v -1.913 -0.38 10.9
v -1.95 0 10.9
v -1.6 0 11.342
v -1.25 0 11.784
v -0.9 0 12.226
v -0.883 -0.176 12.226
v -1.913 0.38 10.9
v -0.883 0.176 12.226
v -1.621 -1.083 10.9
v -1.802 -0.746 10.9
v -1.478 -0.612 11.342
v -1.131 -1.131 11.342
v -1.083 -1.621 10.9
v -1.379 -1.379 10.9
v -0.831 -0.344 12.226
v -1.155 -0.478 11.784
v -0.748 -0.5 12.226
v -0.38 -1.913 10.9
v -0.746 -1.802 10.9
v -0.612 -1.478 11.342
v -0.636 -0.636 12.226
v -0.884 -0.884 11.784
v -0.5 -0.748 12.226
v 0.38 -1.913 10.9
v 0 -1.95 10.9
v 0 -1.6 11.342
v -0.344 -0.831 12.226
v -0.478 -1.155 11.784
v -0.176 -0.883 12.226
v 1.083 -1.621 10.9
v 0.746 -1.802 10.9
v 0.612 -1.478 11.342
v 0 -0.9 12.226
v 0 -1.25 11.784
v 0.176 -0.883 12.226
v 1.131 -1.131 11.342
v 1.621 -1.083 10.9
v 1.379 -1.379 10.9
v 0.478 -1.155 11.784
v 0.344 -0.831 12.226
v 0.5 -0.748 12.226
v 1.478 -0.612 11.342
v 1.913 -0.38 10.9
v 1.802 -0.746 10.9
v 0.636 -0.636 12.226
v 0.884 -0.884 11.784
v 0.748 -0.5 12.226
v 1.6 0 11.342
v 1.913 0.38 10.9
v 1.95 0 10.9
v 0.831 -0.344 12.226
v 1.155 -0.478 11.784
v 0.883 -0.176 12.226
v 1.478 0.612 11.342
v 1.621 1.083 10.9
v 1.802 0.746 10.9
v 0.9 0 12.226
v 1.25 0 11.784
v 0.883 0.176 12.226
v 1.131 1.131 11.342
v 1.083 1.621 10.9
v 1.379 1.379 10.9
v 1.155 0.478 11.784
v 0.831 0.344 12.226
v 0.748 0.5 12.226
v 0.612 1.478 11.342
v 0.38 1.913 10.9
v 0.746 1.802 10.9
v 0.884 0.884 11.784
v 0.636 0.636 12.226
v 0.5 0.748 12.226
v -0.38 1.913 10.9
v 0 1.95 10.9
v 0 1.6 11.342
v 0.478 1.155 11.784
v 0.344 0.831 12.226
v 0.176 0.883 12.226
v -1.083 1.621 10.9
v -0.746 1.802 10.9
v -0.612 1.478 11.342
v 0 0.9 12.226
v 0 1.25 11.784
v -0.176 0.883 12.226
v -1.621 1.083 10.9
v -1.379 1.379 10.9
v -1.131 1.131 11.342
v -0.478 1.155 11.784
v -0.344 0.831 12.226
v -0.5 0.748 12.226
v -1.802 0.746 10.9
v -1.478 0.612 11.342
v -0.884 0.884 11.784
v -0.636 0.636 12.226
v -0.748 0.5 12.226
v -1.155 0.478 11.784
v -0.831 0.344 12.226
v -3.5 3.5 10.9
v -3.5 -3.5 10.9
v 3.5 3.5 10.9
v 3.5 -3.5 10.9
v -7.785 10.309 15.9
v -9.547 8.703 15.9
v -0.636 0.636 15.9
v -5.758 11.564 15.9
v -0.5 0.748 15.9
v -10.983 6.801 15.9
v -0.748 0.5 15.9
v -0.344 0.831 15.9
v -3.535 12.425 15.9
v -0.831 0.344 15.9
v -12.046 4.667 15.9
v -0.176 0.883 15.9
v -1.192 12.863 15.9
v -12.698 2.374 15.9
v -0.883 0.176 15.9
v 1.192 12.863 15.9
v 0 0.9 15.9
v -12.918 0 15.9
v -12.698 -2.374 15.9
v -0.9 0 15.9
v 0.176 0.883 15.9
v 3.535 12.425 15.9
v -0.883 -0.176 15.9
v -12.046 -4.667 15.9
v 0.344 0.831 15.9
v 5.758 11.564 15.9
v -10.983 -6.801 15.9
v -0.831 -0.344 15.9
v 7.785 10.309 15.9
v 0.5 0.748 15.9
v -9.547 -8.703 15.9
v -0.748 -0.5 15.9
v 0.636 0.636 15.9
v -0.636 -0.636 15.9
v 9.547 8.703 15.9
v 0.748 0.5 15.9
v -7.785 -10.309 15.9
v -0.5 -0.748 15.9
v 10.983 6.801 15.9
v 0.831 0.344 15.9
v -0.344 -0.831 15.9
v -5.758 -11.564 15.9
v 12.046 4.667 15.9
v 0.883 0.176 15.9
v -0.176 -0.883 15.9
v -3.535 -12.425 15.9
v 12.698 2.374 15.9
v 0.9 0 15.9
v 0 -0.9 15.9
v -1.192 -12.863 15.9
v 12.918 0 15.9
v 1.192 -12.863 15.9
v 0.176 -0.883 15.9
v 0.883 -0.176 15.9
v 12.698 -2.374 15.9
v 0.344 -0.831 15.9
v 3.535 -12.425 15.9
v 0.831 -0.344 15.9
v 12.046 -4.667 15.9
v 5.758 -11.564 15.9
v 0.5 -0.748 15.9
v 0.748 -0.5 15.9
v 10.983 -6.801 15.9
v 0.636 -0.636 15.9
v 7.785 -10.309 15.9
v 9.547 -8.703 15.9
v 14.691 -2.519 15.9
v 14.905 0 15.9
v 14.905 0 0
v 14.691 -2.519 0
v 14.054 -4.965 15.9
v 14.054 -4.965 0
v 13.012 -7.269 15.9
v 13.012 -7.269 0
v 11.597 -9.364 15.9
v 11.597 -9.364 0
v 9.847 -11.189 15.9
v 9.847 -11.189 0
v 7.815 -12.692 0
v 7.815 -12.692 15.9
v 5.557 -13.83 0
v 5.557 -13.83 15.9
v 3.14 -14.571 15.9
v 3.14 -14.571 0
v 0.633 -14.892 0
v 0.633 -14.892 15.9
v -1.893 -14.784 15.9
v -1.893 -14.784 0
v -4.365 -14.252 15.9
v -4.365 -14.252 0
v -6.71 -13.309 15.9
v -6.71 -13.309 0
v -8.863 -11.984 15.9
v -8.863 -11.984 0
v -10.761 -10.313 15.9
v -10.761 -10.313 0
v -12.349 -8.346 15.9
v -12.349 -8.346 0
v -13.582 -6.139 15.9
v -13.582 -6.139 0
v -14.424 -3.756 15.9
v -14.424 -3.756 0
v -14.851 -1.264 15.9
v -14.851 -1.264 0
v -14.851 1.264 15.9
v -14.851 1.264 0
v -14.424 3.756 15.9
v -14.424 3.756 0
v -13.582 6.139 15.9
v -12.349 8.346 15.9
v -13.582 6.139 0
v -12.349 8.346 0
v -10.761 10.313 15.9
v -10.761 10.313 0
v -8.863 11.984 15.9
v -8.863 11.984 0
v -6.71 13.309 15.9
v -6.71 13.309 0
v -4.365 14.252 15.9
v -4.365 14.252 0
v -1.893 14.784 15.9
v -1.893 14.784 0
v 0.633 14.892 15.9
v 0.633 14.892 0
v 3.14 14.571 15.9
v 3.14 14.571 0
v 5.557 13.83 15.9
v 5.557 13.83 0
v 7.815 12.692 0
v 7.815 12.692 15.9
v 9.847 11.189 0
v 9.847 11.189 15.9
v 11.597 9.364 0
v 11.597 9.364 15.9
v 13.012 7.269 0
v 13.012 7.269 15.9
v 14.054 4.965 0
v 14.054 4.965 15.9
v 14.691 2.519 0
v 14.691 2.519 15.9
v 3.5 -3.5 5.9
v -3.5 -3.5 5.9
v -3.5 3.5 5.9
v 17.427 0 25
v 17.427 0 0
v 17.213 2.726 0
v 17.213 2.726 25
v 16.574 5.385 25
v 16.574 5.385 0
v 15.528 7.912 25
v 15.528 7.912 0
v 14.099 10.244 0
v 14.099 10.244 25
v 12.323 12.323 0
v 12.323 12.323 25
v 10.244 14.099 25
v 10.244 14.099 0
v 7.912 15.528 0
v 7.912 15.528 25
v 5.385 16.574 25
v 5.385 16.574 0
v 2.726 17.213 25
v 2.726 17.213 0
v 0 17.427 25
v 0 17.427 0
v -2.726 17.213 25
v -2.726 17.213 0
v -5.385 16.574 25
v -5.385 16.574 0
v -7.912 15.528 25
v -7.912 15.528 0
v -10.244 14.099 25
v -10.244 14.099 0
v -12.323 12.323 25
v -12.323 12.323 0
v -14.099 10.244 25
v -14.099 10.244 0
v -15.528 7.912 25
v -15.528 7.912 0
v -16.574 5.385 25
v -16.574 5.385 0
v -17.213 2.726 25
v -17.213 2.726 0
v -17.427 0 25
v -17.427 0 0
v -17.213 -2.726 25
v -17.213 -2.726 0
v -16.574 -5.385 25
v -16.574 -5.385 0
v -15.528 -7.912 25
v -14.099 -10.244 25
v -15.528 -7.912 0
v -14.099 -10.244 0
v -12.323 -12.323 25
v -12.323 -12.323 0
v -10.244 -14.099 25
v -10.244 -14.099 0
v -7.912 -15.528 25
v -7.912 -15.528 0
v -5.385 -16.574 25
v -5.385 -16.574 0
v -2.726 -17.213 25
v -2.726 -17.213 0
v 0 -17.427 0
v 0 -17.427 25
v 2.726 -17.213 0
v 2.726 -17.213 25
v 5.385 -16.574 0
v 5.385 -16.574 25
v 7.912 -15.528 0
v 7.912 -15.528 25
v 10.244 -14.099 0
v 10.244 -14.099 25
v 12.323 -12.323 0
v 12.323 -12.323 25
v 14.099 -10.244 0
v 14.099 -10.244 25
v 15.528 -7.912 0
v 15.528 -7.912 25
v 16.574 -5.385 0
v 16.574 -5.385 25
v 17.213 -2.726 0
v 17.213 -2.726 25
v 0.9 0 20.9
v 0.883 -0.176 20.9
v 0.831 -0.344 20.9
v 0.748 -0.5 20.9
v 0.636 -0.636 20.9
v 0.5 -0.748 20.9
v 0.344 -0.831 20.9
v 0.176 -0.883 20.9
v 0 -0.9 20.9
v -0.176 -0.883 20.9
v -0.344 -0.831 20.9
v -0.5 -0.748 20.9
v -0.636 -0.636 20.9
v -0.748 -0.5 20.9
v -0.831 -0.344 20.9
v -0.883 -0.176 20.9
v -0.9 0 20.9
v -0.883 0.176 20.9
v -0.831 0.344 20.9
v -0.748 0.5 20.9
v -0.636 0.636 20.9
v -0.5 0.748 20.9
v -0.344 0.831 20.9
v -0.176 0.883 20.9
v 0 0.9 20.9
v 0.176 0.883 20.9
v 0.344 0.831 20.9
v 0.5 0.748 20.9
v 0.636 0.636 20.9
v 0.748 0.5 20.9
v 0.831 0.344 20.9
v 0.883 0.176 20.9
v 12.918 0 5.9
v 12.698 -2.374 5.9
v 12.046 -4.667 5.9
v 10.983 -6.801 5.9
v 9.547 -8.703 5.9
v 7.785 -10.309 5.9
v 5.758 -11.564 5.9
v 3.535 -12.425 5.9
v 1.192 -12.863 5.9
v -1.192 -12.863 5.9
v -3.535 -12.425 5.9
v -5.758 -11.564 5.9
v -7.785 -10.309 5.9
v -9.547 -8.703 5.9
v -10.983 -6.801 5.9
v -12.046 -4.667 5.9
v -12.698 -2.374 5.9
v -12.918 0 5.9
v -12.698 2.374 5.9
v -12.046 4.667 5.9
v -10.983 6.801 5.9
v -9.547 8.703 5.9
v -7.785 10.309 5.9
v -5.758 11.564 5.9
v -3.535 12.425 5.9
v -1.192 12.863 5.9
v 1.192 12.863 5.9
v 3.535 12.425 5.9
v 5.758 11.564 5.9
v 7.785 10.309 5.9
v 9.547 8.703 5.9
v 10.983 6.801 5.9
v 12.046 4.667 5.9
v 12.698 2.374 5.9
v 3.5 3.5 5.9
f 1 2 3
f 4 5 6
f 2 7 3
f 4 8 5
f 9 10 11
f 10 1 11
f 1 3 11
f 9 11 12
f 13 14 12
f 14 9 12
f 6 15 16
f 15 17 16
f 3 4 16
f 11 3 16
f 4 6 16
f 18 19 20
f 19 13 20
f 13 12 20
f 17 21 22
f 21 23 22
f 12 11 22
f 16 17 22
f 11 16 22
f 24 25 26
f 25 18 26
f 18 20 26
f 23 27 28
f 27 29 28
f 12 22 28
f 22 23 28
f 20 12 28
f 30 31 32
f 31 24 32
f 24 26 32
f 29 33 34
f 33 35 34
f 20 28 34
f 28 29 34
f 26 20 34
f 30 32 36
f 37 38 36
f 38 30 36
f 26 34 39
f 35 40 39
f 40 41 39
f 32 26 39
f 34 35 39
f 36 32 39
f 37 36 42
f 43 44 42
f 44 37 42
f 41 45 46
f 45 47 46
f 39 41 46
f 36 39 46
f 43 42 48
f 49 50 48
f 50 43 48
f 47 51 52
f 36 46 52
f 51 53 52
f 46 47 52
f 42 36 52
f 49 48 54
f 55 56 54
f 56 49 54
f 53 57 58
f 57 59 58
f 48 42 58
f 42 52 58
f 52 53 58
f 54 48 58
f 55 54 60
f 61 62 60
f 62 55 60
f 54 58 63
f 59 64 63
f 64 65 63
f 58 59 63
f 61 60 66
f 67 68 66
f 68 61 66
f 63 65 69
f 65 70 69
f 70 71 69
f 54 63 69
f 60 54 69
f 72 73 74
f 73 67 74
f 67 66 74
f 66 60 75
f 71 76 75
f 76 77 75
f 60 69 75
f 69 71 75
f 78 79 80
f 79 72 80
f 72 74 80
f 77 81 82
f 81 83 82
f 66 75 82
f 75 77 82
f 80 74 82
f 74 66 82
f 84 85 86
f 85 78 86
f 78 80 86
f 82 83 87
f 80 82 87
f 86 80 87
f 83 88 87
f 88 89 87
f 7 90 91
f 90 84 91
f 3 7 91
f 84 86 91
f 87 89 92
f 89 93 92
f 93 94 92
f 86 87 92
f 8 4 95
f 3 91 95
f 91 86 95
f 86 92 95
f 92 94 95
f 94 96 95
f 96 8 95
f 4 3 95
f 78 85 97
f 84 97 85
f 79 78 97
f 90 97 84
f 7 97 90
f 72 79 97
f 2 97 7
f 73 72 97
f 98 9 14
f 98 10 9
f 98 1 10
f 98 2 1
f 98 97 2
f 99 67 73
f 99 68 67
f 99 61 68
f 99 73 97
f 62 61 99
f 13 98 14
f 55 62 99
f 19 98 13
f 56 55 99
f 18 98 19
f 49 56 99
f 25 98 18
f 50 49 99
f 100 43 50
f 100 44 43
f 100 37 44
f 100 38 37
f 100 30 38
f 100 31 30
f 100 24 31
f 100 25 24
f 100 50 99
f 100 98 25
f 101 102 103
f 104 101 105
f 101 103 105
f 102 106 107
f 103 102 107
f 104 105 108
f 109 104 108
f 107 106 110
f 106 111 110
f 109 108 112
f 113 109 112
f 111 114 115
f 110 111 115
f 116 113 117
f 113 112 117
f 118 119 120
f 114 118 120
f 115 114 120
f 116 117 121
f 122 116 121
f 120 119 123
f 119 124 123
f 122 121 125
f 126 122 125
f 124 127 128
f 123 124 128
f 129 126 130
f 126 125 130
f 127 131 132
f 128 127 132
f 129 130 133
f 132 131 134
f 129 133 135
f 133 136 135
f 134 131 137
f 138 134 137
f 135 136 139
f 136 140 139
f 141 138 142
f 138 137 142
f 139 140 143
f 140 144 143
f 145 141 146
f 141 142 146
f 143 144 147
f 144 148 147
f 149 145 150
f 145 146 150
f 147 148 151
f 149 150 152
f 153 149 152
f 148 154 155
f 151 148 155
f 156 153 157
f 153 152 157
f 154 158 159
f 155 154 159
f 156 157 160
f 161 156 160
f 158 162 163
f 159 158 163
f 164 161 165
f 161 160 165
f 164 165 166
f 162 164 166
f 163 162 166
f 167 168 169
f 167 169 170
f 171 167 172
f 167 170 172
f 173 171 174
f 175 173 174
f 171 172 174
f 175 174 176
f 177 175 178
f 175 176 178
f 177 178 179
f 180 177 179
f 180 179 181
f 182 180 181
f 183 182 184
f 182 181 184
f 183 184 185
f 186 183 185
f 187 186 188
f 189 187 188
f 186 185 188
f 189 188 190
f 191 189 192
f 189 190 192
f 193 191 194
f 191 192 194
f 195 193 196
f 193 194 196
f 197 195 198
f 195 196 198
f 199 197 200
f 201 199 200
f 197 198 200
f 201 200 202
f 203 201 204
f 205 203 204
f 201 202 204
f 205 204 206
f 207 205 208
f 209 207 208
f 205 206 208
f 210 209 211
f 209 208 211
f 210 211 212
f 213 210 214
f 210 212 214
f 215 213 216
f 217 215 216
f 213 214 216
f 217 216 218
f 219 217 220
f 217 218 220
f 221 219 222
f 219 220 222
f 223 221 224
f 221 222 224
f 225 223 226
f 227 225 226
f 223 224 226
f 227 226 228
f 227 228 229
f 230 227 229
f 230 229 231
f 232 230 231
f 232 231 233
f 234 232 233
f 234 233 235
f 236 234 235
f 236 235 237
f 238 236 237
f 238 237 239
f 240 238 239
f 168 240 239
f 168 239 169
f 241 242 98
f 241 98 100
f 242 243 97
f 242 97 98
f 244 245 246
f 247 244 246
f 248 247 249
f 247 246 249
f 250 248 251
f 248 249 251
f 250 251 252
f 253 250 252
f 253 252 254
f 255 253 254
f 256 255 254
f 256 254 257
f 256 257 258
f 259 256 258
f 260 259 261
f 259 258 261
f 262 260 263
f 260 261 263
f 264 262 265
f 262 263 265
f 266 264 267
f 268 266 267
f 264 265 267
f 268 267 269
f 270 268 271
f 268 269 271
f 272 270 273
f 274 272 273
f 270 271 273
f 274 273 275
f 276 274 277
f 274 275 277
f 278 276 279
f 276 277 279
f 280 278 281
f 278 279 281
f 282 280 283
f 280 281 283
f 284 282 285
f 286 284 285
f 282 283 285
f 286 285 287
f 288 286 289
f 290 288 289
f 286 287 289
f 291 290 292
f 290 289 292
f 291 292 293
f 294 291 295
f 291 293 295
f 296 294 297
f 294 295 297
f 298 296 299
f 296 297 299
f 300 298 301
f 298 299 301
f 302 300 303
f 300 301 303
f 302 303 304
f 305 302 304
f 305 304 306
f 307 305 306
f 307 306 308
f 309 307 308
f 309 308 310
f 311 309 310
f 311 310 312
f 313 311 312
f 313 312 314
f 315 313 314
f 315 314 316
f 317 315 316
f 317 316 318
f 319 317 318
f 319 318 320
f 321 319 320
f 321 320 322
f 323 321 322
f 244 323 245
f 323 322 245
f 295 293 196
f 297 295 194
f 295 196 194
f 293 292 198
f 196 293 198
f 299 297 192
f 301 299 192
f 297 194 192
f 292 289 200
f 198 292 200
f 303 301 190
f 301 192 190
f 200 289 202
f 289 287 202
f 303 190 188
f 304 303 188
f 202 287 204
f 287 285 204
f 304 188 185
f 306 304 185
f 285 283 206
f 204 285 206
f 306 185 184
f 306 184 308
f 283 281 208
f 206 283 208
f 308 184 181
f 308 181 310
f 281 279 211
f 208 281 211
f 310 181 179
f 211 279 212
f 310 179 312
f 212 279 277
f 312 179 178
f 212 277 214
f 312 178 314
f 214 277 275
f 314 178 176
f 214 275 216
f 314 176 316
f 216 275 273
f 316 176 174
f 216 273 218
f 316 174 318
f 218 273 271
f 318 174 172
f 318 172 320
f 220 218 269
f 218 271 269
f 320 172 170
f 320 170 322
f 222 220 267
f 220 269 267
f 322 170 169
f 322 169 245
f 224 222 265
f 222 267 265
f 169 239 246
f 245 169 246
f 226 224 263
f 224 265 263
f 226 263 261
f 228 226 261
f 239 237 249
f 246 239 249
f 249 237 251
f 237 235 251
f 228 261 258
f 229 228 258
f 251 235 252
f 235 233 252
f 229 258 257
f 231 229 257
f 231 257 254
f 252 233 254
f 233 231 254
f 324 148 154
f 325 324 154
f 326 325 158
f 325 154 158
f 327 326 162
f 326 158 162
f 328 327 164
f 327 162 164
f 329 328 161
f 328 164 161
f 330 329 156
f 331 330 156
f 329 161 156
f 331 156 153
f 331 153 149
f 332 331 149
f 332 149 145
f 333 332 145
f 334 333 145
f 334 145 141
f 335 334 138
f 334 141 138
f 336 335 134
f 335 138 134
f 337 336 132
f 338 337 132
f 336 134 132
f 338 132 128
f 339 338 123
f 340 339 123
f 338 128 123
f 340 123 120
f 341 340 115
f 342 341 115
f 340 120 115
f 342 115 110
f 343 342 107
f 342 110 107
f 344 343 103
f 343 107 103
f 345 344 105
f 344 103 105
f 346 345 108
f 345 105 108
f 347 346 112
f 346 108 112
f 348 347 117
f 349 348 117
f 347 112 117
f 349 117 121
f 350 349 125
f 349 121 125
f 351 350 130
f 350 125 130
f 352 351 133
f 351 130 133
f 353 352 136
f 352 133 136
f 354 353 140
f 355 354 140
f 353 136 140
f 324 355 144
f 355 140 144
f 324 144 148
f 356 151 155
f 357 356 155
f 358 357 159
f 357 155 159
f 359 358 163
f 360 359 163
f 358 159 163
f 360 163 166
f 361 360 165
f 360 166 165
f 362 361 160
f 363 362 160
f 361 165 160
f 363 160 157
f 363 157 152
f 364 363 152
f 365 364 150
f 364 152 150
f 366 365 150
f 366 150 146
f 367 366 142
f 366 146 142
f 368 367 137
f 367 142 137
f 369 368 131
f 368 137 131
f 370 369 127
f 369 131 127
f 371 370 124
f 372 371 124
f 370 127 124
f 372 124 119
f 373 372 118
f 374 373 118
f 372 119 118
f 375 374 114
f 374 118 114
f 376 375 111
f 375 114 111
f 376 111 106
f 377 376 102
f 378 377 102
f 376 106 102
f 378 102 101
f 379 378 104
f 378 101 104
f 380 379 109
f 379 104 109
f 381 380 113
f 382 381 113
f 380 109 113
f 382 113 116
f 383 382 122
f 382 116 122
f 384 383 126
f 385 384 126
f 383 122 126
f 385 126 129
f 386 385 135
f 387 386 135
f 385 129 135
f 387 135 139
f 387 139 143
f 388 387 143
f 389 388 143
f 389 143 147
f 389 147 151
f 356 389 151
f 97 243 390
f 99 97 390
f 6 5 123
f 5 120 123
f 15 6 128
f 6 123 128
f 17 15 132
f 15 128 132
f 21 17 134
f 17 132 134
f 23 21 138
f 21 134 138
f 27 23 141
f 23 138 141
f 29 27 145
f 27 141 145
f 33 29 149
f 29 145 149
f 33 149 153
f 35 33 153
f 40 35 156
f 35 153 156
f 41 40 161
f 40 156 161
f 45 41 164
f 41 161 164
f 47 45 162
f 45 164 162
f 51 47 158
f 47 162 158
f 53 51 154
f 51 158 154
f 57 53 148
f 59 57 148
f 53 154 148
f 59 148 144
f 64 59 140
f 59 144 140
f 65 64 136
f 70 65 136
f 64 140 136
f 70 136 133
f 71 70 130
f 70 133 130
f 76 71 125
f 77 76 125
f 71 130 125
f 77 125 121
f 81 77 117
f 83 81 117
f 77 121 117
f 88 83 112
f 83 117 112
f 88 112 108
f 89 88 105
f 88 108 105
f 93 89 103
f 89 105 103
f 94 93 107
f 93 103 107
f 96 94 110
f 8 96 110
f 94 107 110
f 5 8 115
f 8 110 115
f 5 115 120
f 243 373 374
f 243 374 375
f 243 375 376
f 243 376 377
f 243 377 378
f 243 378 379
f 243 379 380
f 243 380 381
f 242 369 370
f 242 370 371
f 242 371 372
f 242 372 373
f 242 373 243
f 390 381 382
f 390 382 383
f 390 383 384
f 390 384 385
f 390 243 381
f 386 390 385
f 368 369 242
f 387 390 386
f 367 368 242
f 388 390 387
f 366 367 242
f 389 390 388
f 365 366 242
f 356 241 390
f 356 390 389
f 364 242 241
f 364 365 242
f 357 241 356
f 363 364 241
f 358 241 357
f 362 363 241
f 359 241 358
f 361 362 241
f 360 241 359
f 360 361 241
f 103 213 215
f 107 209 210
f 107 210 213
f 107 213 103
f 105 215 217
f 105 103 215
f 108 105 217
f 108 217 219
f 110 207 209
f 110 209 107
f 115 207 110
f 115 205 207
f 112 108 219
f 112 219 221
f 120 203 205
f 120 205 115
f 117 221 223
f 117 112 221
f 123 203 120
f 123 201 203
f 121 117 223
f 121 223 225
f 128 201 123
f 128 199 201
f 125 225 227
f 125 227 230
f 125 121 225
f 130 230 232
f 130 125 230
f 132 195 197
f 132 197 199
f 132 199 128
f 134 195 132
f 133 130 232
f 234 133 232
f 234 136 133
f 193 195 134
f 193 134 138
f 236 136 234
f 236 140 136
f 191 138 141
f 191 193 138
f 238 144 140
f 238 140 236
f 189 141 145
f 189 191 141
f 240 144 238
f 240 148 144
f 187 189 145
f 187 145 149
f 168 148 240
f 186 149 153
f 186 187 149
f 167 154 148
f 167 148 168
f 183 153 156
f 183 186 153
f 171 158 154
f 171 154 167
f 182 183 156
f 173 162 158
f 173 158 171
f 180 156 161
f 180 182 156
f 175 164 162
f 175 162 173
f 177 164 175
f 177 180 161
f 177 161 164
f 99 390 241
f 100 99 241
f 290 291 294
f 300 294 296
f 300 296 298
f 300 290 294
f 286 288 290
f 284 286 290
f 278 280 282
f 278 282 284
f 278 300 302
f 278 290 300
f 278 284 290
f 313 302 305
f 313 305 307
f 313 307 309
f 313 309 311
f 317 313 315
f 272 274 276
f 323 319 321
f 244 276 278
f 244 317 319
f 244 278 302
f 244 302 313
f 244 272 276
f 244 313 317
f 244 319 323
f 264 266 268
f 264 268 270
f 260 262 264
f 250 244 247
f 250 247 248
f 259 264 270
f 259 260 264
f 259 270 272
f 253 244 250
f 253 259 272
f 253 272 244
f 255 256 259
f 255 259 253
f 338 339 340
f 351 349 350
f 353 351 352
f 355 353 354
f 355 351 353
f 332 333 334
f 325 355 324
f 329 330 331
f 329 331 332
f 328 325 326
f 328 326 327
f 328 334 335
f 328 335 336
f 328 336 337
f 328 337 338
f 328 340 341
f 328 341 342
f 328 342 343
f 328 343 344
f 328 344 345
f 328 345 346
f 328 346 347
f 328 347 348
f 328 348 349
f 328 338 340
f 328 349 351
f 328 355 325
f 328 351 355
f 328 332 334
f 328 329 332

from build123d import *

# Parameters (mm, degrees)
F0_R            = 17.4272984751
F1_DEPTH        = 25
F2_R            = 14.9051186422
F3_DEPTH        = 15.9
F4_R            = 0.9
F5_DEPTH        = 5
F6_R            = 12.9181741615
F7_DEPTH        = 10
F9_W            = 7
F9_H            = 7
F10_DEPTH       = 5
F11_D           = 1.8
F11_DEPTH       = 5
F11_START       = 5
F11_CSINK_D     = 3.9
F11_CSINK_ANGLE = 76.734
F11_TIP         = 0.5407745571


with BuildPart() as f1:
    # F0 (on Top) → F1 (new body)
    with BuildSketch(Plane.XY):
        Circle(F0_R)
    extrude(amount=F1_DEPTH)

    # F2 (on face) → F3 (cut)
    with BuildSketch(Plane(origin=(0, 0, 0), x_dir=(1, 0, 0), z_dir=(0, 0, -1))):
        Circle(F2_R)
    extrude(amount=-F3_DEPTH, mode=Mode.SUBTRACT)

    # F4 (on face) → F5 (cut)
    with BuildSketch(Plane(origin=(0, 0, 15.9), x_dir=(1, 0, 0), z_dir=(0, 0, -1))):
        Circle(F4_R)
    extrude(amount=-F5_DEPTH, mode=Mode.SUBTRACT)


with BuildPart() as f7:
    # F6 (on face) → F7 (new body)
    with BuildSketch(Plane(origin=(0, 0, 15.9), x_dir=(1, 0, 0), z_dir=(0, 0, -1))):
        Circle(F6_R)
    extrude(amount=F7_DEPTH)

    # F9 (on face) → F10 (cut)
    with BuildSketch(Plane(origin=(0, 0, 5.9), x_dir=(1, 0, 0), z_dir=(0, 0, -1))):
        Rectangle(F9_W, F9_H)
    extrude(amount=-F10_DEPTH, mode=Mode.SUBTRACT)

    # F11
    # its depths count from where the whole tool has entered the part; down to there all is cleared
    with Locations(Plane(origin=(0, 0, 5.9), x_dir=(1, 0, 0), z_dir=(0, 0, -1)).offset(-F11_START)):
        with Locations((0, 0)):
            CounterSinkHole(F11_D / 2, F11_CSINK_D / 2, depth=F11_DEPTH, counter_sink_angle=F11_CSINK_ANGLE)
            with Locations((0, 0, -(F11_DEPTH + F11_TIP / 2))):  # 118° drill point
                Cone(0, F11_D / 2, F11_TIP, mode=Mode.SUBTRACT)


solid = Compound([f1.part, f7.part])
